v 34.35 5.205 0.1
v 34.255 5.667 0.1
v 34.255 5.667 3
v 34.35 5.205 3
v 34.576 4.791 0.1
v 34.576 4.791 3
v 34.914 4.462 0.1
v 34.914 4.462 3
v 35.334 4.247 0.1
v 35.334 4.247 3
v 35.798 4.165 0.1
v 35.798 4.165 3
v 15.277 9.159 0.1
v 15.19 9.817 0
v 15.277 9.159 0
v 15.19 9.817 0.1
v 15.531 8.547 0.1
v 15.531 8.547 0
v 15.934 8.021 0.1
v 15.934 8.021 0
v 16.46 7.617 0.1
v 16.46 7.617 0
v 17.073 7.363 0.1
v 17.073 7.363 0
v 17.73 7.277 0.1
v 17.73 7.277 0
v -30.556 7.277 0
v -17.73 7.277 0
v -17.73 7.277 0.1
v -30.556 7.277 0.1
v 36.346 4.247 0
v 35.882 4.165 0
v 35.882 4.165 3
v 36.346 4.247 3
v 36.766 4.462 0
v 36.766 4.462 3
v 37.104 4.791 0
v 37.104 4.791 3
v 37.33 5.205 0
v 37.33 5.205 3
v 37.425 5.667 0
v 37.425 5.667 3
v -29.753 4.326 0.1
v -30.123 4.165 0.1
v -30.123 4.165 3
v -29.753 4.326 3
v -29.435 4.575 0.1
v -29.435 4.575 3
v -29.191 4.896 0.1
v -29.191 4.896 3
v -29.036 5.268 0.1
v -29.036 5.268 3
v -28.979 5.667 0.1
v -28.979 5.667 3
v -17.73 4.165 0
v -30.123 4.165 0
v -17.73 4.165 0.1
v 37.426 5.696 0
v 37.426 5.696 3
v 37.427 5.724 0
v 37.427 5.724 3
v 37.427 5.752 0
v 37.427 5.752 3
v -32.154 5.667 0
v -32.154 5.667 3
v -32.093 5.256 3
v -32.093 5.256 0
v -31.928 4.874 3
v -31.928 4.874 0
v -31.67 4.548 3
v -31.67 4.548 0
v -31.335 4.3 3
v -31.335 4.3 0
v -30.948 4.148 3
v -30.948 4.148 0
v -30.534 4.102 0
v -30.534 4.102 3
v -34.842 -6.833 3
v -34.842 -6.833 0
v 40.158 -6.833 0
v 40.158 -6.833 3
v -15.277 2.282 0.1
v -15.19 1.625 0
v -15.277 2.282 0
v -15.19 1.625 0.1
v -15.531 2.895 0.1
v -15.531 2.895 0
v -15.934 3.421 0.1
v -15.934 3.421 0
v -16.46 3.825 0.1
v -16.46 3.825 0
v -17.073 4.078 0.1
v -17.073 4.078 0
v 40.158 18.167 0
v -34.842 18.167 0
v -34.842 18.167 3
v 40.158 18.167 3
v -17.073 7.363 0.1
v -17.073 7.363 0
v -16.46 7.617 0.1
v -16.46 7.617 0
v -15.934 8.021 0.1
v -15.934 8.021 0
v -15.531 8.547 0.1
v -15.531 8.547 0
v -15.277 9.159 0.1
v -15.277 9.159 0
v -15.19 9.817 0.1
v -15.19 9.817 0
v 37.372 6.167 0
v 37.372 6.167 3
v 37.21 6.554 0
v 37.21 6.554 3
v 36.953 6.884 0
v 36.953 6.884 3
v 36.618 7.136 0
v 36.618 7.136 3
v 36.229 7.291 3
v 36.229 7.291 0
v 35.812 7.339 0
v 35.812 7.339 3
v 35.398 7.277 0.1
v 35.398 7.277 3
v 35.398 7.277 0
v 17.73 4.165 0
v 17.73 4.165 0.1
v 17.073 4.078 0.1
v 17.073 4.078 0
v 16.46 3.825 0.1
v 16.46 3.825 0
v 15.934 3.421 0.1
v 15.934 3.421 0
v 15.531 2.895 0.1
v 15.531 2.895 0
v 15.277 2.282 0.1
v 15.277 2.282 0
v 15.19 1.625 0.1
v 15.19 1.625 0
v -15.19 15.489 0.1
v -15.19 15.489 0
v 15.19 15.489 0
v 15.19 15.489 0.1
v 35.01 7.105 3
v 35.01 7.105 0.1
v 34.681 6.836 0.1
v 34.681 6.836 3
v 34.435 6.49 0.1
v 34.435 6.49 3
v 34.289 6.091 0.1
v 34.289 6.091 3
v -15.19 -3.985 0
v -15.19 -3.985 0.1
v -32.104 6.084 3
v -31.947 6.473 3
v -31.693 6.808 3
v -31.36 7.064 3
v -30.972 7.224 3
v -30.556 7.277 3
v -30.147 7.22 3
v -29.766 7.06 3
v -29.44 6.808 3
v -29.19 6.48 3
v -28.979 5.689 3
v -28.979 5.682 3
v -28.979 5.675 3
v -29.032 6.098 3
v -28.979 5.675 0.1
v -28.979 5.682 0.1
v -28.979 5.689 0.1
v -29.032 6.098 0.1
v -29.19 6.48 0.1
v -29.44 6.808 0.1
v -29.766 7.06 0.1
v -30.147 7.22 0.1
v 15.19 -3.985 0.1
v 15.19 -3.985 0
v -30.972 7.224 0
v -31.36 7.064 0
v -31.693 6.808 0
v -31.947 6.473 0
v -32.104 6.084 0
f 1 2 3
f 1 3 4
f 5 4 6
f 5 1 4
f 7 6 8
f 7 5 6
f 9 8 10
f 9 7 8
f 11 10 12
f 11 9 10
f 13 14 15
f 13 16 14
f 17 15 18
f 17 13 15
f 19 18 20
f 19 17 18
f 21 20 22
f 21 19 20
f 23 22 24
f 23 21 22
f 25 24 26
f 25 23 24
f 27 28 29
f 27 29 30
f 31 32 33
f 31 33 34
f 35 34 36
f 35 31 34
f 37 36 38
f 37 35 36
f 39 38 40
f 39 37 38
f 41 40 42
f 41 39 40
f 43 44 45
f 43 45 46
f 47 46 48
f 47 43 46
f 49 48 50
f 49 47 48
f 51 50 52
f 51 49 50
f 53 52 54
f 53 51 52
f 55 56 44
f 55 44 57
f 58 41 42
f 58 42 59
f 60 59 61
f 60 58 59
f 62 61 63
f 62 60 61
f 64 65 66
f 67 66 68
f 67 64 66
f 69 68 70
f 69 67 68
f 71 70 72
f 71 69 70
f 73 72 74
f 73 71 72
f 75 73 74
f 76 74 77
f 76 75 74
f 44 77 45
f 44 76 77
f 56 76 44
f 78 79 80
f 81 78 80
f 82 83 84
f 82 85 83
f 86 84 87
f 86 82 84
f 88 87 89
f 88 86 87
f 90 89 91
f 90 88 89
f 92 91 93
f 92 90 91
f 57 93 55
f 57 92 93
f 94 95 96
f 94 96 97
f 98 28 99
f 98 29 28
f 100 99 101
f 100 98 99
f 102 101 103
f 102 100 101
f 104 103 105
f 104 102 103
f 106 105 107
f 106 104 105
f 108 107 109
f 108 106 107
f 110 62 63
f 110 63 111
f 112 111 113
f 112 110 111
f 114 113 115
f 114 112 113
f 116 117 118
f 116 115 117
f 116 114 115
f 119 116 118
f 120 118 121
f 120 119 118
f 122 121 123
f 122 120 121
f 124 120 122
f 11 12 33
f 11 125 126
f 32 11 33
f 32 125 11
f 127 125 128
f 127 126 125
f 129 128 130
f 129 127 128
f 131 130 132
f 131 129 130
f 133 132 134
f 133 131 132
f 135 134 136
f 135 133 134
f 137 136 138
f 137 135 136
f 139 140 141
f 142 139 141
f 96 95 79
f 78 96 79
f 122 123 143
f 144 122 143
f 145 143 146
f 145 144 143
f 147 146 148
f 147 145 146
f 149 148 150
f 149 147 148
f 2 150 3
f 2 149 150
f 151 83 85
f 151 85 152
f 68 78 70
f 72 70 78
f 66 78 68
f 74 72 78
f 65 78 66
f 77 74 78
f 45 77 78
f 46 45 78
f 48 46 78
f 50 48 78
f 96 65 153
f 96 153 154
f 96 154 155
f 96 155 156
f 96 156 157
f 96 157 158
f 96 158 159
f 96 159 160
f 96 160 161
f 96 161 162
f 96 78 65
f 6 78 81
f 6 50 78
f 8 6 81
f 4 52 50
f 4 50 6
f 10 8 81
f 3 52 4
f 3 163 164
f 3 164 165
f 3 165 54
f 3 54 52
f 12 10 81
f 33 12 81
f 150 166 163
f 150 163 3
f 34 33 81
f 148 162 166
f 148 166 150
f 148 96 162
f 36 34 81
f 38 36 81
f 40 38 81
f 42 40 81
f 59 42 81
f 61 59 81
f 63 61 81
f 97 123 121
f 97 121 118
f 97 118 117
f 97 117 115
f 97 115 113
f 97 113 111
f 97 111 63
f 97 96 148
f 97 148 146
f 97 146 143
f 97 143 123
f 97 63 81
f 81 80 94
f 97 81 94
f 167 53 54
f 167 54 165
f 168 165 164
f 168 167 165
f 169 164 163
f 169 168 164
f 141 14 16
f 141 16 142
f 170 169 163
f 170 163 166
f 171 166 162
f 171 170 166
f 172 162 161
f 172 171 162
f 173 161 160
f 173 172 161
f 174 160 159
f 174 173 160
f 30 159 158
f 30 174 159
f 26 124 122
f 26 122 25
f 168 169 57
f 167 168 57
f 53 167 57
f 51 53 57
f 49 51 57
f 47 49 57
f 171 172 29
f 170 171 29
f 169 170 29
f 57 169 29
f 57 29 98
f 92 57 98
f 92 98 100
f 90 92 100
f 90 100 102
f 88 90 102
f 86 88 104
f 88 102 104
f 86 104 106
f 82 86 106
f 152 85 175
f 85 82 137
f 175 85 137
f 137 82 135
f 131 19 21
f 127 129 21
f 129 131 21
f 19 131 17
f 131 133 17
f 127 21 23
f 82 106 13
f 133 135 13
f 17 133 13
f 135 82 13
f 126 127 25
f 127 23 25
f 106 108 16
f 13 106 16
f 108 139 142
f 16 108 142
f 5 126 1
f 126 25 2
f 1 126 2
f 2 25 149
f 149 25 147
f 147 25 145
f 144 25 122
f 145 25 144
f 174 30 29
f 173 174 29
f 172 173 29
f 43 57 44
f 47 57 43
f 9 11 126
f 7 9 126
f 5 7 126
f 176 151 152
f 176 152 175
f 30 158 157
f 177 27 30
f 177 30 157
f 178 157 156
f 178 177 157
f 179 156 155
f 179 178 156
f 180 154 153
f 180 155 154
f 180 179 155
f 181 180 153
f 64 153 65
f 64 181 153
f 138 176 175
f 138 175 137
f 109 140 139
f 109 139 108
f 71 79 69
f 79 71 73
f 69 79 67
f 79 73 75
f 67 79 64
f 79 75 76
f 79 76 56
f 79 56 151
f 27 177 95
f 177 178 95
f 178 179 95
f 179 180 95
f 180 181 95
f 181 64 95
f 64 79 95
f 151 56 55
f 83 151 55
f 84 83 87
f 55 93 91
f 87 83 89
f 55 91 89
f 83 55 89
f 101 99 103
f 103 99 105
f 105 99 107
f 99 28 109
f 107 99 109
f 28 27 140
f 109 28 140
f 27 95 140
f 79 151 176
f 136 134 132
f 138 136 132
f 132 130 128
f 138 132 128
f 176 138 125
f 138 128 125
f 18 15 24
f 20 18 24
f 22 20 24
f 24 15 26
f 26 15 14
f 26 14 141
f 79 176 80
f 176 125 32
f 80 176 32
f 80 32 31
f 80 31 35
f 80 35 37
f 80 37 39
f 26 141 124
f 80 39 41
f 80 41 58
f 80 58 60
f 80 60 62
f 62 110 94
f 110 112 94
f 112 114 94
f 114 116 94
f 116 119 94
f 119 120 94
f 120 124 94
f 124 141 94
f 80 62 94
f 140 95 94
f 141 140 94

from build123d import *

# Parameters (mm, degrees)
F0_W     = 75
F0_H     = 12.5
F2_DEPTH = 3
F3_DEPTH = 25.4
F1_W     = 30.3805638105
F1_H     = 1.609168168
F1_H_2   = 8.2122374663
F1_H_3   = 1.5025624558
F1_H_4   = 8.1500614509
F4_DEPTH = 0.1
F5_R     = 2.54


# Not quite as in the source:
# - a feature names something its author has since deleted; it is built from what else it names


with BuildPart() as f2:
    # F0 (on Top) → F2 (new body)
    with BuildSketch(Plane.XY):
        with Locations((2.6580473056, -0.5825519562)):
            Rectangle(F0_W, F0_H)
        with Locations((2.6580473056, 11.9174480438)):
            Rectangle(F0_W, F0_H)
    extrude(amount=F2_DEPTH)

    # F1 (on face) → F3 (cut)
    with BuildSketch(Plane.XY):
        with BuildLine():
            ThreePointArc((37.4252376516, 5.6674480438), (37.4269210618, 5.709628552), (37.4274823308, 5.7518389076))
            ThreePointArc((37.4274823308, 5.7518389076), (36.7935957485, 7.0210030812), (35.3981560952, 7.2766162118))
            Line((35.3981560952, 7.2766162118), (35.8816406012, 7.2766162118))
            Line((35.8816406012, 7.2766162118), (35.8816406012, 5.6674480438))
            Line((35.8816406012, 5.6674480438), (37.4252376516, 5.6674480438))
        make_face()
        with BuildLine():
            Line((35.8816406012, 7.2766162118), (35.3981560952, 7.2766162118))
            ThreePointArc((35.3981560952, 7.2766162118), (34.5459110587, 6.6713691097), (34.25472701, 5.6674480438))
            Line((34.25472701, 5.6674480438), (35.8816406012, 5.6674480438))
            Line((35.8816406012, 5.6674480438), (35.8816406012, 7.2766162118))
        make_face()
        with BuildLine():
            ThreePointArc((35.8816406012, 4.164885588), (36.9472923333, 4.6142885534), (37.4252376516, 5.6674480438))
            Line((37.4252376516, 5.6674480438), (35.8816406012, 5.6674480438))
            Line((35.8816406012, 5.6674480438), (35.8816406012, 4.164885588))
        make_face()
        with BuildLine():
            Line((35.8816406012, 5.6674480438), (34.25472701, 5.6674480438))
            ThreePointArc((34.25472701, 5.6674480438), (34.7326723283, 4.6142885534), (35.7983240604, 4.164885588))
            Line((35.7983240604, 4.164885588), (35.8816406012, 4.164885588))
            Line((35.8816406012, 4.164885588), (35.8816406012, 5.6674480438))
        make_face()
        with BuildLine():
            Line((-30.5555813976, 5.6674480438), (-30.5555813976, 7.2766162118))
            ThreePointArc((-30.5555813976, 7.2766162118), (-31.6926900402, 6.8077826631), (-32.1536216159, 5.6674480438))
            Line((-32.1536216159, 5.6674480438), (-30.5555813976, 5.6674480438))
        make_face()
        with BuildLine():
            ThreePointArc((-28.9787699914, 5.6891521952), (-29.4399653273, 6.8078988393), (-30.5555813976, 7.2766162118))
            Line((-30.5555813976, 7.2766162118), (-30.5555813976, 5.6674480438))
            Line((-30.5555813976, 5.6674480438), (-28.9789183669, 5.6674480438))
            ThreePointArc((-28.9789183669, 5.6674480438), (-28.9788070858, 5.678299866), (-28.9787699914, 5.6891521952))
        make_face()
        with BuildLine():
            ThreePointArc((-30.1226850953, 4.164885588), (-29.303099666, 4.7276133355), (-28.9789183669, 5.6674480438))
            Line((-28.9789183669, 5.6674480438), (-30.5555813976, 5.6674480438))
            Line((-30.5555813976, 5.6674480438), (-30.5555813976, 4.164885588))
            Line((-30.5555813976, 4.164885588), (-30.1226850953, 4.164885588))
        make_face()
        with BuildLine():
            Line((-30.5555813976, 5.6674480438), (-32.1536216159, 5.6674480438))
            ThreePointArc((-32.1536216159, 5.6674480438), (-31.5104490346, 4.4129538625), (-30.1226850953, 4.164885588))
            Line((-30.1226850953, 4.164885588), (-30.5555813976, 4.164885588))
            Line((-30.5555813976, 4.164885588), (-30.5555813976, 5.6674480438))
        make_face()
    extrude(amount=F3_DEPTH, mode=Mode.SUBTRACT)

    # F1 (on face) → F4 (cut)
    with BuildSketch(Plane.XY):
        with BuildLine():
            ThreePointArc((34.25472701, 5.6674480438), (34.5459110587, 6.6713691097), (35.3981560952, 7.2766162118))
            Line((35.3981560952, 7.2766162118), (15.1902819052, 7.2766162118))
            Line((15.1902819052, 7.2766162118), (15.1902819052, 5.6674480438))
            Line((15.1902819052, 5.6674480438), (34.25472701, 5.6674480438))
        make_face()
        with BuildLine():
            ThreePointArc((35.7983240604, 4.164885588), (34.7326723283, 4.6142885534), (34.25472701, 5.6674480438))
            Line((34.25472701, 5.6674480438), (15.1902819052, 5.6674480438))
            Line((15.1902819052, 5.6674480438), (15.1902819052, 4.164885588))
            Line((15.1902819052, 4.164885588), (35.7983240604, 4.164885588))
        make_face()
        with Locations((0, 6.4720321278)):
            Rectangle(F1_W, F1_H)
        with Locations((0, 11.382734945)):
            Rectangle(F1_W, F1_H_2)
        with Locations((0, 4.9161668159)):
            Rectangle(F1_W, F1_H_3)
        with BuildLine():
            Line((-15.1902819052, 5.6674480438), (-15.1902819052, 7.2766162118))
            Line((-15.1902819052, 7.2766162118), (-30.5555813976, 7.2766162118))
            ThreePointArc((-30.5555813976, 7.2766162118), (-29.4399653273, 6.8078988393), (-28.9787699914, 5.6891521952))
            ThreePointArc((-28.9787699914, 5.6891521952), (-28.9788070858, 5.678299866), (-28.9789183669, 5.6674480438))
            Line((-28.9789183669, 5.6674480438), (-15.1902819052, 5.6674480438))
        make_face()
        with Locations((0, 0.0898548626)):
            Rectangle(F1_W, F1_H_4)
        with BuildLine():
            Line((-15.1902819052, 4.164885588), (-15.1902819052, 5.6674480438))
            Line((-15.1902819052, 5.6674480438), (-28.9789183669, 5.6674480438))
            ThreePointArc((-28.9789183669, 5.6674480438), (-29.303099666, 4.7276133355), (-30.1226850953, 4.164885588))
            Line((-30.1226850953, 4.164885588), (-15.1902819052, 4.164885588))
        make_face()
    extrude(amount=F4_DEPTH, mode=Mode.SUBTRACT)

    # F5
    f5_edges = [f2.edges().sort_by_distance(p)[0] for p in [
        (-15.190282, 4.164886, 0.05),
        (-15.190282, 7.276616, 0.05),
        (15.190282, 4.164886, 0.05),
        (15.190282, 7.276616, 0.05),
    ]]
    fillet(f5_edges, radius=F5_R)


solid = f2.part
